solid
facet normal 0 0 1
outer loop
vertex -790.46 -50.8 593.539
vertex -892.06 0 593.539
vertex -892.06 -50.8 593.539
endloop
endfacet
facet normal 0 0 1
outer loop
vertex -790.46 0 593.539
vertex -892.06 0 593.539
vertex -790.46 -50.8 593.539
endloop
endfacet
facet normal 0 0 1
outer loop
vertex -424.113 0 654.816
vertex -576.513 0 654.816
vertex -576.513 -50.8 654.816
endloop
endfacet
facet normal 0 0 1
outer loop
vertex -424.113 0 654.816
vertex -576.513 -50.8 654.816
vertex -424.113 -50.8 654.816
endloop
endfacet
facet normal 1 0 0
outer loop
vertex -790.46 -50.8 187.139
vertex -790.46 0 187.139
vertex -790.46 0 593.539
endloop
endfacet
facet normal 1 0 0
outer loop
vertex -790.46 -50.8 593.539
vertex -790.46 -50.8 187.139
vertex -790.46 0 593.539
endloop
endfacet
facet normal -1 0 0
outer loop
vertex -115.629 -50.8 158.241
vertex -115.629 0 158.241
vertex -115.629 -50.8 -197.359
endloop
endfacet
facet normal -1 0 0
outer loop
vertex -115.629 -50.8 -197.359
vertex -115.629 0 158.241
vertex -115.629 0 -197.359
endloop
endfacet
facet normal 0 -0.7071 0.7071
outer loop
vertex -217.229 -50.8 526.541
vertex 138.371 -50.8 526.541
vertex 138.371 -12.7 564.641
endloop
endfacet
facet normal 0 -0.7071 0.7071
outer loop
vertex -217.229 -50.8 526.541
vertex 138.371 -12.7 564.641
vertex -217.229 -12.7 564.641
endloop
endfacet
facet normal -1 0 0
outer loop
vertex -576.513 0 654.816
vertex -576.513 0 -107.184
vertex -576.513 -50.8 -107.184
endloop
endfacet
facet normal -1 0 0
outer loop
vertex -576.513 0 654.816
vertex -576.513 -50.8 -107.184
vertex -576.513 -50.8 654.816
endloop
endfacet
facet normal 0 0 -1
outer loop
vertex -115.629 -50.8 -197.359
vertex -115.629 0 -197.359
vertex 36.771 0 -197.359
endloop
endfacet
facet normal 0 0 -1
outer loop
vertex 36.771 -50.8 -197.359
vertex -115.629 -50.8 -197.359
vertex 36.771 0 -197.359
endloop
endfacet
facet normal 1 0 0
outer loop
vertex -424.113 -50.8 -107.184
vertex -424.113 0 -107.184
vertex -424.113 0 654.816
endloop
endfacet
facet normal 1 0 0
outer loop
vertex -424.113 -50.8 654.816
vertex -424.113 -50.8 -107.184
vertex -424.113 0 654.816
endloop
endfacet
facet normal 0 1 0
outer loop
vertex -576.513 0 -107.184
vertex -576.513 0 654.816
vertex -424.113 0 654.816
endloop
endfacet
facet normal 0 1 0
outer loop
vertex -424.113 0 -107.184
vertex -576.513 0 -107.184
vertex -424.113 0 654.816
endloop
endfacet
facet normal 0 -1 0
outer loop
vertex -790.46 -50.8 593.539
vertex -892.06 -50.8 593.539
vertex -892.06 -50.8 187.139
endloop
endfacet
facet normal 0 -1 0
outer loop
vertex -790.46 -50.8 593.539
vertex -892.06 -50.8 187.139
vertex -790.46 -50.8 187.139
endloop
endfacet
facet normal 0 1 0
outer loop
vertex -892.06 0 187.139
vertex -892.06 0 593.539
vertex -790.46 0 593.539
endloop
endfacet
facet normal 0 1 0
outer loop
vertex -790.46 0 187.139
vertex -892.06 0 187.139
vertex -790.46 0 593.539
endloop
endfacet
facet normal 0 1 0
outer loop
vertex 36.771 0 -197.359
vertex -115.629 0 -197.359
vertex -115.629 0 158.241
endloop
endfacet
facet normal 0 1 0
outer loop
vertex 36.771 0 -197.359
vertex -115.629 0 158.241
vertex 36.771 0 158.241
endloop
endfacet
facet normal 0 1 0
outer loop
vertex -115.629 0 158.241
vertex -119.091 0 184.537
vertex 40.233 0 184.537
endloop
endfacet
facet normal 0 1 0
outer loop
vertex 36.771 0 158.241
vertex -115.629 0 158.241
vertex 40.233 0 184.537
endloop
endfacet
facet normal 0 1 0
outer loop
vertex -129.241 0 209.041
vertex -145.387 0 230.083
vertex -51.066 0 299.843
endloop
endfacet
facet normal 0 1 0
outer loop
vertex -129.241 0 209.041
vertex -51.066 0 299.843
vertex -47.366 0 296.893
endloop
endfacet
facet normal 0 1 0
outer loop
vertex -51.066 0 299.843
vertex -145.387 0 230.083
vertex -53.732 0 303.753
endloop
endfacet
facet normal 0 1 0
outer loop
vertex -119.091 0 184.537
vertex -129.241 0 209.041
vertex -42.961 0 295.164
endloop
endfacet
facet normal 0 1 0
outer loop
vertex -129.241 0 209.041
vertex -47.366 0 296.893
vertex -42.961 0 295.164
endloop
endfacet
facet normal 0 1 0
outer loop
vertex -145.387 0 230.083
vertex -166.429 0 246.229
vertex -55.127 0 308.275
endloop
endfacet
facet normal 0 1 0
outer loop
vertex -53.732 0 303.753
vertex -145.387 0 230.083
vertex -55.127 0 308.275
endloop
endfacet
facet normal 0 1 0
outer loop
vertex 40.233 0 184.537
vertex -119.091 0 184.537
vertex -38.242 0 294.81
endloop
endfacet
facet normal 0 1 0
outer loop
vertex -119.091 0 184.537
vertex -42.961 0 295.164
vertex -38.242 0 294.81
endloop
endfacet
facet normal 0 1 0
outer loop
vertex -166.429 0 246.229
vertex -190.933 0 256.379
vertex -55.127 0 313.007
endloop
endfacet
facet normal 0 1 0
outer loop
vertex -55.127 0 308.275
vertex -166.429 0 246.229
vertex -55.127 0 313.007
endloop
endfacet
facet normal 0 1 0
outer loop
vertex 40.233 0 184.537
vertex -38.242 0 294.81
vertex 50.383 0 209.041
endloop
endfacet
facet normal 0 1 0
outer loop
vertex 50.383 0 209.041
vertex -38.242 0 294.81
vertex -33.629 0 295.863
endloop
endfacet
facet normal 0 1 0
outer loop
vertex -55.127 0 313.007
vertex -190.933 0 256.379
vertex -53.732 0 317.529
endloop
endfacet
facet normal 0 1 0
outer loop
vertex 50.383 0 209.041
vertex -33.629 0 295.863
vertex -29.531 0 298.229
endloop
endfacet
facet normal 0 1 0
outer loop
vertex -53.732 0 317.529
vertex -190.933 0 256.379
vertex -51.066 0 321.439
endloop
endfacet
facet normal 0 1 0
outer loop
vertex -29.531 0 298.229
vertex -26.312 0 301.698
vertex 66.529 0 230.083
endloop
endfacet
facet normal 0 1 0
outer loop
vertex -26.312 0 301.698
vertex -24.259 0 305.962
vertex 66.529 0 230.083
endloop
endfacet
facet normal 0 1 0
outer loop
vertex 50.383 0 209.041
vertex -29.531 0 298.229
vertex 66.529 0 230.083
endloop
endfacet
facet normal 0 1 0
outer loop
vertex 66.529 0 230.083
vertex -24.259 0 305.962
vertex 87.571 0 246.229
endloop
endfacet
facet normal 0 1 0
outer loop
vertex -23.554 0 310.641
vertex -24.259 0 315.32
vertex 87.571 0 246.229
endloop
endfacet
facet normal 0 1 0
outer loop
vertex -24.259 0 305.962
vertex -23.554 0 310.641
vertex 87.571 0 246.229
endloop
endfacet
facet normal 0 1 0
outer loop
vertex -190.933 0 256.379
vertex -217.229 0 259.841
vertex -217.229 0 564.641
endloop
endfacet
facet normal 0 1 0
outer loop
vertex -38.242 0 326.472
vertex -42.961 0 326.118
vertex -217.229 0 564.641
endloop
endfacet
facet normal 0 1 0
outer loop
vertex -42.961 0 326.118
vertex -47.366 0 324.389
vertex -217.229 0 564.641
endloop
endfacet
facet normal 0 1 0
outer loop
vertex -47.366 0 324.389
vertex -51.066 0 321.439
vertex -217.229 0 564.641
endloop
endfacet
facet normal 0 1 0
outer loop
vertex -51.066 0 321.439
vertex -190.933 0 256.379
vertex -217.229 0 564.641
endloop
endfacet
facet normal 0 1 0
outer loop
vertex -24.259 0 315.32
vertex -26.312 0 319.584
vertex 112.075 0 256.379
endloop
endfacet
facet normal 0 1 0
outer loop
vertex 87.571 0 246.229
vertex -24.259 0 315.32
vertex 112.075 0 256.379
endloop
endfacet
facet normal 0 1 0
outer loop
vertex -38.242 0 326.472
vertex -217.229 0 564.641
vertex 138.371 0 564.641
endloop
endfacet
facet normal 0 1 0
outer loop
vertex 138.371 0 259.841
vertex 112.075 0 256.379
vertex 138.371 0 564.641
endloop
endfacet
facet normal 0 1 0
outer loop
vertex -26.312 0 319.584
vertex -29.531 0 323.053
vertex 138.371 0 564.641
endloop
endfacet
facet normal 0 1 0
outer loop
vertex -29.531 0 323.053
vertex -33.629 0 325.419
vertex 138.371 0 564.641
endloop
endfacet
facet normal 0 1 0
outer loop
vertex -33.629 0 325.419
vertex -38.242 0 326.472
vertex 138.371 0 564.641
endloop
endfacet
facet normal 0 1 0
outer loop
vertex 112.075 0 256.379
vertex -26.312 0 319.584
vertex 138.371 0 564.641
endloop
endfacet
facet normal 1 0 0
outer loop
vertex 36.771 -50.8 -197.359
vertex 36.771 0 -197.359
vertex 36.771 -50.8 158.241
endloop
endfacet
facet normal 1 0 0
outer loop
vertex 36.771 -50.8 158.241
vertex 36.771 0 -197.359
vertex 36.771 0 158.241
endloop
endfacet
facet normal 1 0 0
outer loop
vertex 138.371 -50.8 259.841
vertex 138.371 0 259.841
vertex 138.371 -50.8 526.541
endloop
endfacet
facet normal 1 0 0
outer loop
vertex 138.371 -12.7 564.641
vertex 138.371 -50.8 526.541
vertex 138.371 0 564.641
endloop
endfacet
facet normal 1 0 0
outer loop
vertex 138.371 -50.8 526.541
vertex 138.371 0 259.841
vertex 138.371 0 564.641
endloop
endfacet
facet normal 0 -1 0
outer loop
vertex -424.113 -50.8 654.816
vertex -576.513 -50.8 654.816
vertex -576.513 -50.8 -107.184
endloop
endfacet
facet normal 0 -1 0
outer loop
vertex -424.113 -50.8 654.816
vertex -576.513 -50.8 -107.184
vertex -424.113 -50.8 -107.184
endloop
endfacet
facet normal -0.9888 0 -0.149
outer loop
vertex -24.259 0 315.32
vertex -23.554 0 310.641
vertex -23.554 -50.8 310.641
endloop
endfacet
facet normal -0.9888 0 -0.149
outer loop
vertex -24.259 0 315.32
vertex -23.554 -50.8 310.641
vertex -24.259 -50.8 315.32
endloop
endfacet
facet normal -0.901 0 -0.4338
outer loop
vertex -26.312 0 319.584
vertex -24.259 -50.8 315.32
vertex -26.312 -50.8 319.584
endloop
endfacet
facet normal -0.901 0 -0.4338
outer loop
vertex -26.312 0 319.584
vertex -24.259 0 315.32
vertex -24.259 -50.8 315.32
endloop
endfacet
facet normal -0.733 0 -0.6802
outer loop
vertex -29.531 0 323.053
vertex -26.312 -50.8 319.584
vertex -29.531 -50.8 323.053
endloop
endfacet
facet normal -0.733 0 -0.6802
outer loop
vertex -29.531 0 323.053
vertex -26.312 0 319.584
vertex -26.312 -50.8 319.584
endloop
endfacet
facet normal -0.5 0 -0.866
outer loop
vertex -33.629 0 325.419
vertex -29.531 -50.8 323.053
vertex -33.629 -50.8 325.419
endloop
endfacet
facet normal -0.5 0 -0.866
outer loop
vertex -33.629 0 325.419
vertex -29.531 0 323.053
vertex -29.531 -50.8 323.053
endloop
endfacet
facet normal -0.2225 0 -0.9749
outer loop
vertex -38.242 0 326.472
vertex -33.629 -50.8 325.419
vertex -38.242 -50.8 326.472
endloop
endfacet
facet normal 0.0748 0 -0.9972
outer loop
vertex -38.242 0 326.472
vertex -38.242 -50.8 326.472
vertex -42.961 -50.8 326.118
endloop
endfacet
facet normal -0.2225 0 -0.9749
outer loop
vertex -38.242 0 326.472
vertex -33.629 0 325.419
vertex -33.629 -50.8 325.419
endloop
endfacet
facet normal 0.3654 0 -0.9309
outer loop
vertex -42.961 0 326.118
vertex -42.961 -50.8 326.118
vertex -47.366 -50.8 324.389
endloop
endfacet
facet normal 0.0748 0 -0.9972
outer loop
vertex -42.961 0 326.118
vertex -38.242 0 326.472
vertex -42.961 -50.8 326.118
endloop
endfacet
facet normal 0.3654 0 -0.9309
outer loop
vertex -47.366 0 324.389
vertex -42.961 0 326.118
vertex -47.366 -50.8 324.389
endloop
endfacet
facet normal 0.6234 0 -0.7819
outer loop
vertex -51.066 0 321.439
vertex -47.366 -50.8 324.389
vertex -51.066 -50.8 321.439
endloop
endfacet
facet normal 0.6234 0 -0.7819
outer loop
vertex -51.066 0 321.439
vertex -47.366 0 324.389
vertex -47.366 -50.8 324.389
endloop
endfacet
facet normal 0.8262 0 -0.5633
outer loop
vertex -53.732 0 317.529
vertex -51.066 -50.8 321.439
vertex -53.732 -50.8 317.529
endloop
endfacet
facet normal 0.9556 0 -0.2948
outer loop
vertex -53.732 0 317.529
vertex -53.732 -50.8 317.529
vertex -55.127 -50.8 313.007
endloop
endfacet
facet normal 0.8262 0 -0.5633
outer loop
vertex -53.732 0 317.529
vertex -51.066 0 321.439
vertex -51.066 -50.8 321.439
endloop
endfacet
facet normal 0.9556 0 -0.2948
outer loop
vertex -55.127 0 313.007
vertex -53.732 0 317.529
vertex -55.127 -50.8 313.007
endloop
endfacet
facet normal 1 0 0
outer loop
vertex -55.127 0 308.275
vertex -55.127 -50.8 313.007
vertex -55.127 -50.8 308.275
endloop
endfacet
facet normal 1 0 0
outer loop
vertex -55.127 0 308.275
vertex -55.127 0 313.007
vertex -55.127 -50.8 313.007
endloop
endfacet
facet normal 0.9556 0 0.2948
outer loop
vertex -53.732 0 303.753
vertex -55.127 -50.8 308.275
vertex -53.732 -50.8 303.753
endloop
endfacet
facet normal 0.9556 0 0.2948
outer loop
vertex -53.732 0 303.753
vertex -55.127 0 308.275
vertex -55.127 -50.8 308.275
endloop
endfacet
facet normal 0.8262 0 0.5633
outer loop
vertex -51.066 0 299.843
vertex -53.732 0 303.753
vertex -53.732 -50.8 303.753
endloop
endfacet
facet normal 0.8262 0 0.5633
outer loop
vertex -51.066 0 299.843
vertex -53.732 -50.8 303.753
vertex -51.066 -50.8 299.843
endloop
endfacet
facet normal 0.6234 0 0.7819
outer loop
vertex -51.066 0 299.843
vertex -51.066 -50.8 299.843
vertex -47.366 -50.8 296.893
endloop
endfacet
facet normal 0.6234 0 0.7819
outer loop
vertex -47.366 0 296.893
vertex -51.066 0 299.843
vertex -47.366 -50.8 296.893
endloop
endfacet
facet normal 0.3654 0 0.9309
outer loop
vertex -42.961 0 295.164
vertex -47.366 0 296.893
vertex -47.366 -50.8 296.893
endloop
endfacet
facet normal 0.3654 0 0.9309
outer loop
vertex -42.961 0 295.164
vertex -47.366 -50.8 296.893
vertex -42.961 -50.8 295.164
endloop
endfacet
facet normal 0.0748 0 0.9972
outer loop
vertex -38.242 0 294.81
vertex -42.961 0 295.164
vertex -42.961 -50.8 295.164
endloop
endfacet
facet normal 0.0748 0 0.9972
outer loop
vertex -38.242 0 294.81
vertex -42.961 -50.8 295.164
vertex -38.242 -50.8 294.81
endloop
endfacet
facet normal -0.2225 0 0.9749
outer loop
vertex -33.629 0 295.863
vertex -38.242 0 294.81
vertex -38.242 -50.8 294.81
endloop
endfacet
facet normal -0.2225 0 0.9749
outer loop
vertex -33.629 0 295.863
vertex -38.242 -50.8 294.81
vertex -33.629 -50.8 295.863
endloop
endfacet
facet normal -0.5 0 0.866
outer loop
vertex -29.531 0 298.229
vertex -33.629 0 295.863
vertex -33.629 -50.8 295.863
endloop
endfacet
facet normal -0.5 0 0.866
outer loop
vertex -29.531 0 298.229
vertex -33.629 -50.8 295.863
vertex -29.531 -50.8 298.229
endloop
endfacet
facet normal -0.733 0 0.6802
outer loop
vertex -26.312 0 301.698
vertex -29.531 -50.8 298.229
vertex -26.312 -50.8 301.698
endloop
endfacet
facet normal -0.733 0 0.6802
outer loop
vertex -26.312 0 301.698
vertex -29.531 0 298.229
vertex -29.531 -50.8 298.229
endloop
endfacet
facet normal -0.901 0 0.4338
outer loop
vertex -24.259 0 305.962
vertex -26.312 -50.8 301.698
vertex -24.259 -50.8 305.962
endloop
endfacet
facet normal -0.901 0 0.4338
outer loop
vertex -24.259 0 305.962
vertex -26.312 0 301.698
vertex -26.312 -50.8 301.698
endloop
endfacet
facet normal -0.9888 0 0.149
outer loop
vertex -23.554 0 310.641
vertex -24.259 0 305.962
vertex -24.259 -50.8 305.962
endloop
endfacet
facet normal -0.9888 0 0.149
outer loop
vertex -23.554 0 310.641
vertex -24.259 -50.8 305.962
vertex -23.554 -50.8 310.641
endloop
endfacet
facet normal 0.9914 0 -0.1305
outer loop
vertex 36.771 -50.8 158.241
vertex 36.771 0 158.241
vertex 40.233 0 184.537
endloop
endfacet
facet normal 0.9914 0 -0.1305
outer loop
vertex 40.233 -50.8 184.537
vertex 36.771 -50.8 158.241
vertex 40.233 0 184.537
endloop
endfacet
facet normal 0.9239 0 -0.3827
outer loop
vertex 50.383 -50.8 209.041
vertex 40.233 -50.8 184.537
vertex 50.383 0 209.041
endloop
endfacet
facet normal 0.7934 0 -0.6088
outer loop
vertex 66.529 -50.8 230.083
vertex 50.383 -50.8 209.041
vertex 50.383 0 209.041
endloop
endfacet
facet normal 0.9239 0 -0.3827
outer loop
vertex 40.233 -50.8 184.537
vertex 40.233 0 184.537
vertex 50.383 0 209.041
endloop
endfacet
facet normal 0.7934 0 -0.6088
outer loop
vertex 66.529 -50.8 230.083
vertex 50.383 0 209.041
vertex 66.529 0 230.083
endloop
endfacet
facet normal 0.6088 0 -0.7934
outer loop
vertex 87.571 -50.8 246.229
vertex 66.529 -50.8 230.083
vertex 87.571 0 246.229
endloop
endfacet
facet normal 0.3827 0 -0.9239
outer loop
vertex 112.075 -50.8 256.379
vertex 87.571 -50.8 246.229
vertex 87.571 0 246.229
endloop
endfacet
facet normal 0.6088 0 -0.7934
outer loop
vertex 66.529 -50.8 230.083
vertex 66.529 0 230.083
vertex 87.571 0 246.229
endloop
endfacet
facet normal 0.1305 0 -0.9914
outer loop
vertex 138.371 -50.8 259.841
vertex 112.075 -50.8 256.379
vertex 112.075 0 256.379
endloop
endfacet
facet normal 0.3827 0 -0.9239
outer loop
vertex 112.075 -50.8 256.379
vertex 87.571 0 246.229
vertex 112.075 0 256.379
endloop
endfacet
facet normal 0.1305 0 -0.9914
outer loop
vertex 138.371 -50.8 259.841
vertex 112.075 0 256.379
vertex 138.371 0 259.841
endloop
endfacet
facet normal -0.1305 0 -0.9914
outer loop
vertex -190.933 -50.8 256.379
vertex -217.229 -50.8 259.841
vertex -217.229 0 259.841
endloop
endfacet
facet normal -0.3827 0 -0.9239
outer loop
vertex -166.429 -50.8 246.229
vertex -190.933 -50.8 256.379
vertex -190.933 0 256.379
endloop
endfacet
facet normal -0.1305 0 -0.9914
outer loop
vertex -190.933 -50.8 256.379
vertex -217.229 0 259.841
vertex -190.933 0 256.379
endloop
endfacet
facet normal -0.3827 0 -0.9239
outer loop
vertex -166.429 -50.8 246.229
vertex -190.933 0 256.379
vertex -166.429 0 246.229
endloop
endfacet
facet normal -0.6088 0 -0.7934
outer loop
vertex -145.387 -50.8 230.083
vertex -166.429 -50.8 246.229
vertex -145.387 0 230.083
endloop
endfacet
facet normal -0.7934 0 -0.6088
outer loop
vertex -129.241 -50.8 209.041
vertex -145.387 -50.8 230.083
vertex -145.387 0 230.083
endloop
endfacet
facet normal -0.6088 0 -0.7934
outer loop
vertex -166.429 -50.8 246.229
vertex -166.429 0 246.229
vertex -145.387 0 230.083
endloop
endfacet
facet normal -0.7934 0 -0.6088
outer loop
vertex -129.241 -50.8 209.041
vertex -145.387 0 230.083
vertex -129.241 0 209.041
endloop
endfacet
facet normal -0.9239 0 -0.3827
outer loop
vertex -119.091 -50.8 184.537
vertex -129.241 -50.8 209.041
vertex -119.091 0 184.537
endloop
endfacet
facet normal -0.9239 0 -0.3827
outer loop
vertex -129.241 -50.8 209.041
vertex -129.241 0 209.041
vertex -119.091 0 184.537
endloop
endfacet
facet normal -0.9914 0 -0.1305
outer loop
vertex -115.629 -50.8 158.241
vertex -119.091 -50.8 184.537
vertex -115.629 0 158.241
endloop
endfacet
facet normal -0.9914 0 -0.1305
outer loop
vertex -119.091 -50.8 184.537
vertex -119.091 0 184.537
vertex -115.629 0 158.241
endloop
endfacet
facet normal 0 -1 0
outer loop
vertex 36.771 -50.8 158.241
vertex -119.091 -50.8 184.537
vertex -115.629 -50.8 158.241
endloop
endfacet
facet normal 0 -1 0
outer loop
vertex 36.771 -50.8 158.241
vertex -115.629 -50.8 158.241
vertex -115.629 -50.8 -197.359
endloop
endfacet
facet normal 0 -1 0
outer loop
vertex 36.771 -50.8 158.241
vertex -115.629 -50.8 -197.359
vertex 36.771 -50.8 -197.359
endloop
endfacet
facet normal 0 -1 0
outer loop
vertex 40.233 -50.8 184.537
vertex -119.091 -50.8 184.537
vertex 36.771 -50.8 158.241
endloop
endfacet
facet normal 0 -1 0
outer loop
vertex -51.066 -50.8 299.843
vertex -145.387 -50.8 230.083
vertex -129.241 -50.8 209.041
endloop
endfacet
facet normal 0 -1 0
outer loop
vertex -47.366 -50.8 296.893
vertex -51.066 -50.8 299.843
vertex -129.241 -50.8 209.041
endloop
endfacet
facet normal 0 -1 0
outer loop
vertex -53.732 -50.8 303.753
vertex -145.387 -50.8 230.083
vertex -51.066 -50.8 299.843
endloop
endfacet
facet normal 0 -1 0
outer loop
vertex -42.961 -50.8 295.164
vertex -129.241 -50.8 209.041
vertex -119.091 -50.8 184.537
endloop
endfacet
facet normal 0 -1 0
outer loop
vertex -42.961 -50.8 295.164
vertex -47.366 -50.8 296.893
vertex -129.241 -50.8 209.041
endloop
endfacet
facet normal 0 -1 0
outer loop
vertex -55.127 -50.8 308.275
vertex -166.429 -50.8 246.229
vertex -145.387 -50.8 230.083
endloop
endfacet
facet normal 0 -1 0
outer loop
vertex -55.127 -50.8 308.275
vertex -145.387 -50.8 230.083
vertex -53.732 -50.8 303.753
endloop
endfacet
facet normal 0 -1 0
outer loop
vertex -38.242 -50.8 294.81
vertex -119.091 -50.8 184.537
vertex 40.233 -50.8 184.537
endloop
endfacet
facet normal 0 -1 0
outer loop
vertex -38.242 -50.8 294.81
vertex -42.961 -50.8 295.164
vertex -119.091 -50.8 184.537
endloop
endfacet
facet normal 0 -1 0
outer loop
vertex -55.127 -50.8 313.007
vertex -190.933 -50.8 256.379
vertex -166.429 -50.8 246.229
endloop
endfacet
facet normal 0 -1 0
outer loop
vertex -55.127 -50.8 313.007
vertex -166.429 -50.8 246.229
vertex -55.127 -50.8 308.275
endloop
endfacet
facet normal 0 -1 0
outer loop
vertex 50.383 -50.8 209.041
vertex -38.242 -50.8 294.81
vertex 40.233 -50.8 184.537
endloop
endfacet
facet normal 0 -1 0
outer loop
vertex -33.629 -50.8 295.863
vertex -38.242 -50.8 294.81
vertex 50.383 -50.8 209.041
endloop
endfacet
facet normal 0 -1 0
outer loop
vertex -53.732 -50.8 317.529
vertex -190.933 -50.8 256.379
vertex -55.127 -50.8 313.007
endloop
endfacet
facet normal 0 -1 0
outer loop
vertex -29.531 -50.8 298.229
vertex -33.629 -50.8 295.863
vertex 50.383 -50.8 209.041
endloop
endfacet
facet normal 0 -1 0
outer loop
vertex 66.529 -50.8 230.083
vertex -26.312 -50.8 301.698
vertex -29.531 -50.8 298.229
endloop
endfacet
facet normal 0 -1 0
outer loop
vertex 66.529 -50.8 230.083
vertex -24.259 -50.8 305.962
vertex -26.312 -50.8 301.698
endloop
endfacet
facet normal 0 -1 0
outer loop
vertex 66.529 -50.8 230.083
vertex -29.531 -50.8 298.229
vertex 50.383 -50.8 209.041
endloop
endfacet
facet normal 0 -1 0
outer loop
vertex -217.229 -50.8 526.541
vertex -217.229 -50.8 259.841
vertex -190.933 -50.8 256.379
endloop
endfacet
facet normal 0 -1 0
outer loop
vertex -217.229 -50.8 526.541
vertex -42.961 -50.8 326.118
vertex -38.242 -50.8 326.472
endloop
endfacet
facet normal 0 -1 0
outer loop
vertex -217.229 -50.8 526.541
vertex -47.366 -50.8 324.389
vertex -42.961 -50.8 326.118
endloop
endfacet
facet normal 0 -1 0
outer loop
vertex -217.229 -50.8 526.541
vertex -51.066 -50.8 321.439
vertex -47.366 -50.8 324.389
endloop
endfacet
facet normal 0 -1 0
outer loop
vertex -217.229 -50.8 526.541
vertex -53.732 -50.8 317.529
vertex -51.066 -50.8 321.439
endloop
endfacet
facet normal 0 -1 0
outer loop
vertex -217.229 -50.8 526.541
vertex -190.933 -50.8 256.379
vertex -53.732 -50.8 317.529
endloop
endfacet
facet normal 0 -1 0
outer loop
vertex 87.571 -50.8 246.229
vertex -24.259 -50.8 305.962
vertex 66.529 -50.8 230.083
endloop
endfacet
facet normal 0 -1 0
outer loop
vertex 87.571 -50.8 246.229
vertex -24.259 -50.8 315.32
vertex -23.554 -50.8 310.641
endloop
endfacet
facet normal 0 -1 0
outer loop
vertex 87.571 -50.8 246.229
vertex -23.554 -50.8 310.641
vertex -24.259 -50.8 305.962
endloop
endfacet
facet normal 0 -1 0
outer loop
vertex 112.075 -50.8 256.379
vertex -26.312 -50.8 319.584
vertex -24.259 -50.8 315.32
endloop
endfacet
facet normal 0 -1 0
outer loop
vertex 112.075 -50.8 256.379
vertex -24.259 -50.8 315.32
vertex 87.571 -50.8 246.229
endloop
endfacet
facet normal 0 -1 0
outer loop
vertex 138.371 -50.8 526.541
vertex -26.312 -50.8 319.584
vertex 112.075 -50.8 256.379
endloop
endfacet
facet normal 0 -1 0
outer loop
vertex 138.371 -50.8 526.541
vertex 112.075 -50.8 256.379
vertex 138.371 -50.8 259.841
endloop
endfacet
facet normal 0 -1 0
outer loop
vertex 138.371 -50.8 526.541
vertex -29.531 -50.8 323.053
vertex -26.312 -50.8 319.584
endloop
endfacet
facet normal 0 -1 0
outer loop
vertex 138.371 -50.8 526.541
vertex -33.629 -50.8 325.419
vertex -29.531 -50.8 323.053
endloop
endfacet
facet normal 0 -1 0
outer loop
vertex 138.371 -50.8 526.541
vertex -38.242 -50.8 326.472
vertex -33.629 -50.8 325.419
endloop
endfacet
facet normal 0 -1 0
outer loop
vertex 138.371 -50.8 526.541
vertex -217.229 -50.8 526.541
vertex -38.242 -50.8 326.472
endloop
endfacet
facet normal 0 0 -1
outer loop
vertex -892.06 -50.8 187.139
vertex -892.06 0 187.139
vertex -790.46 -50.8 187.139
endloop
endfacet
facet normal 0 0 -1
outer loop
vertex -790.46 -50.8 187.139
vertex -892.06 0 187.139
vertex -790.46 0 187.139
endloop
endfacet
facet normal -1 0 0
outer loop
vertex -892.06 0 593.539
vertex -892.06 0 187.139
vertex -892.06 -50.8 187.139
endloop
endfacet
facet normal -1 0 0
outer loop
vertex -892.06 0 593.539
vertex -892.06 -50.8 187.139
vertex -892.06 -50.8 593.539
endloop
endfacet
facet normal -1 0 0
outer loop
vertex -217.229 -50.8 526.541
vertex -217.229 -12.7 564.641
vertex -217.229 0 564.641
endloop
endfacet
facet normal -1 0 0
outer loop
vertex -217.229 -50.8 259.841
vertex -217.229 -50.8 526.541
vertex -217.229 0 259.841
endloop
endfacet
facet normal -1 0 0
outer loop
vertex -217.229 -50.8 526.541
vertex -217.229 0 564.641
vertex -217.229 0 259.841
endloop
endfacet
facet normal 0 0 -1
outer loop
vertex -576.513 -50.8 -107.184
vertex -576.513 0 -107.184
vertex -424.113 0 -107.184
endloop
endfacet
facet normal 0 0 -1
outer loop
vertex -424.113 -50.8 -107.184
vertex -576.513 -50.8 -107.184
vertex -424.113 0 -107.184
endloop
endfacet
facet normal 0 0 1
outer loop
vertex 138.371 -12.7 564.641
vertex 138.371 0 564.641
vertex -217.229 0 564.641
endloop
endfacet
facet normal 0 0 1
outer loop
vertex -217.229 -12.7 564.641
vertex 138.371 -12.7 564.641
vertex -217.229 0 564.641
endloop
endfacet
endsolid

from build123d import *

# Parameters (mm, degrees)
F0_R     = 15.875
F0_W     = 152.4
F0_H     = 762
F0_W_2   = 101.6
F0_H_2   = 406.4
F1_DEPTH = 50.8
F2_SIZE  = 38.1


with BuildPart() as f1:
    # F0 (on Front) → F1 (new body)
    with BuildSketch(Plane.XZ):
        with BuildLine():
            Line((-39.428816, -197.359), (36.771184, -197.359))
            Line((36.771184, -197.359), (36.771184, 4.266582))
            Line((36.771184, 4.266582), (36.771184, 158.241))
            ThreePointArc((36.771184, 158.241), (66.529135, 230.083049), (138.371184, 259.841))
            Line((138.371184, 259.841), (138.371184, 564.641))
            Line((138.371184, 564.641), (-39.428816, 564.641))
            Line((-39.428816, 564.641), (-217.228816, 564.641))
            Line((-217.228816, 564.641), (-217.228816, 259.841))
            ThreePointArc((-217.228816, 259.841), (-145.386767, 230.083049), (-115.628816, 158.241))
            Line((-115.628816, 158.241), (-115.628816, 4.266582))
            Line((-115.628816, 4.266582), (-115.628816, -197.359))
            Line((-115.628816, -197.359), (-39.428816, -197.359))
        make_face()
        with Locations((-39.428816, 310.641)):
            Circle(F0_R, mode=Mode.SUBTRACT)
        with Locations((-500.312694, 273.815813)):
            Rectangle(F0_W, F0_H)
        with Locations((-841.259863, 390.338692)):
            Rectangle(F0_W_2, F0_H_2)
    extrude(amount=F1_DEPTH)

    # F2
    f2_edges = [f1.edges().sort_by_distance(p)[0] for p in [
        (-39.428816, -50.8, 564.641),
    ]]
    chamfer(f2_edges, length=F2_SIZE)


solid = f1.part
